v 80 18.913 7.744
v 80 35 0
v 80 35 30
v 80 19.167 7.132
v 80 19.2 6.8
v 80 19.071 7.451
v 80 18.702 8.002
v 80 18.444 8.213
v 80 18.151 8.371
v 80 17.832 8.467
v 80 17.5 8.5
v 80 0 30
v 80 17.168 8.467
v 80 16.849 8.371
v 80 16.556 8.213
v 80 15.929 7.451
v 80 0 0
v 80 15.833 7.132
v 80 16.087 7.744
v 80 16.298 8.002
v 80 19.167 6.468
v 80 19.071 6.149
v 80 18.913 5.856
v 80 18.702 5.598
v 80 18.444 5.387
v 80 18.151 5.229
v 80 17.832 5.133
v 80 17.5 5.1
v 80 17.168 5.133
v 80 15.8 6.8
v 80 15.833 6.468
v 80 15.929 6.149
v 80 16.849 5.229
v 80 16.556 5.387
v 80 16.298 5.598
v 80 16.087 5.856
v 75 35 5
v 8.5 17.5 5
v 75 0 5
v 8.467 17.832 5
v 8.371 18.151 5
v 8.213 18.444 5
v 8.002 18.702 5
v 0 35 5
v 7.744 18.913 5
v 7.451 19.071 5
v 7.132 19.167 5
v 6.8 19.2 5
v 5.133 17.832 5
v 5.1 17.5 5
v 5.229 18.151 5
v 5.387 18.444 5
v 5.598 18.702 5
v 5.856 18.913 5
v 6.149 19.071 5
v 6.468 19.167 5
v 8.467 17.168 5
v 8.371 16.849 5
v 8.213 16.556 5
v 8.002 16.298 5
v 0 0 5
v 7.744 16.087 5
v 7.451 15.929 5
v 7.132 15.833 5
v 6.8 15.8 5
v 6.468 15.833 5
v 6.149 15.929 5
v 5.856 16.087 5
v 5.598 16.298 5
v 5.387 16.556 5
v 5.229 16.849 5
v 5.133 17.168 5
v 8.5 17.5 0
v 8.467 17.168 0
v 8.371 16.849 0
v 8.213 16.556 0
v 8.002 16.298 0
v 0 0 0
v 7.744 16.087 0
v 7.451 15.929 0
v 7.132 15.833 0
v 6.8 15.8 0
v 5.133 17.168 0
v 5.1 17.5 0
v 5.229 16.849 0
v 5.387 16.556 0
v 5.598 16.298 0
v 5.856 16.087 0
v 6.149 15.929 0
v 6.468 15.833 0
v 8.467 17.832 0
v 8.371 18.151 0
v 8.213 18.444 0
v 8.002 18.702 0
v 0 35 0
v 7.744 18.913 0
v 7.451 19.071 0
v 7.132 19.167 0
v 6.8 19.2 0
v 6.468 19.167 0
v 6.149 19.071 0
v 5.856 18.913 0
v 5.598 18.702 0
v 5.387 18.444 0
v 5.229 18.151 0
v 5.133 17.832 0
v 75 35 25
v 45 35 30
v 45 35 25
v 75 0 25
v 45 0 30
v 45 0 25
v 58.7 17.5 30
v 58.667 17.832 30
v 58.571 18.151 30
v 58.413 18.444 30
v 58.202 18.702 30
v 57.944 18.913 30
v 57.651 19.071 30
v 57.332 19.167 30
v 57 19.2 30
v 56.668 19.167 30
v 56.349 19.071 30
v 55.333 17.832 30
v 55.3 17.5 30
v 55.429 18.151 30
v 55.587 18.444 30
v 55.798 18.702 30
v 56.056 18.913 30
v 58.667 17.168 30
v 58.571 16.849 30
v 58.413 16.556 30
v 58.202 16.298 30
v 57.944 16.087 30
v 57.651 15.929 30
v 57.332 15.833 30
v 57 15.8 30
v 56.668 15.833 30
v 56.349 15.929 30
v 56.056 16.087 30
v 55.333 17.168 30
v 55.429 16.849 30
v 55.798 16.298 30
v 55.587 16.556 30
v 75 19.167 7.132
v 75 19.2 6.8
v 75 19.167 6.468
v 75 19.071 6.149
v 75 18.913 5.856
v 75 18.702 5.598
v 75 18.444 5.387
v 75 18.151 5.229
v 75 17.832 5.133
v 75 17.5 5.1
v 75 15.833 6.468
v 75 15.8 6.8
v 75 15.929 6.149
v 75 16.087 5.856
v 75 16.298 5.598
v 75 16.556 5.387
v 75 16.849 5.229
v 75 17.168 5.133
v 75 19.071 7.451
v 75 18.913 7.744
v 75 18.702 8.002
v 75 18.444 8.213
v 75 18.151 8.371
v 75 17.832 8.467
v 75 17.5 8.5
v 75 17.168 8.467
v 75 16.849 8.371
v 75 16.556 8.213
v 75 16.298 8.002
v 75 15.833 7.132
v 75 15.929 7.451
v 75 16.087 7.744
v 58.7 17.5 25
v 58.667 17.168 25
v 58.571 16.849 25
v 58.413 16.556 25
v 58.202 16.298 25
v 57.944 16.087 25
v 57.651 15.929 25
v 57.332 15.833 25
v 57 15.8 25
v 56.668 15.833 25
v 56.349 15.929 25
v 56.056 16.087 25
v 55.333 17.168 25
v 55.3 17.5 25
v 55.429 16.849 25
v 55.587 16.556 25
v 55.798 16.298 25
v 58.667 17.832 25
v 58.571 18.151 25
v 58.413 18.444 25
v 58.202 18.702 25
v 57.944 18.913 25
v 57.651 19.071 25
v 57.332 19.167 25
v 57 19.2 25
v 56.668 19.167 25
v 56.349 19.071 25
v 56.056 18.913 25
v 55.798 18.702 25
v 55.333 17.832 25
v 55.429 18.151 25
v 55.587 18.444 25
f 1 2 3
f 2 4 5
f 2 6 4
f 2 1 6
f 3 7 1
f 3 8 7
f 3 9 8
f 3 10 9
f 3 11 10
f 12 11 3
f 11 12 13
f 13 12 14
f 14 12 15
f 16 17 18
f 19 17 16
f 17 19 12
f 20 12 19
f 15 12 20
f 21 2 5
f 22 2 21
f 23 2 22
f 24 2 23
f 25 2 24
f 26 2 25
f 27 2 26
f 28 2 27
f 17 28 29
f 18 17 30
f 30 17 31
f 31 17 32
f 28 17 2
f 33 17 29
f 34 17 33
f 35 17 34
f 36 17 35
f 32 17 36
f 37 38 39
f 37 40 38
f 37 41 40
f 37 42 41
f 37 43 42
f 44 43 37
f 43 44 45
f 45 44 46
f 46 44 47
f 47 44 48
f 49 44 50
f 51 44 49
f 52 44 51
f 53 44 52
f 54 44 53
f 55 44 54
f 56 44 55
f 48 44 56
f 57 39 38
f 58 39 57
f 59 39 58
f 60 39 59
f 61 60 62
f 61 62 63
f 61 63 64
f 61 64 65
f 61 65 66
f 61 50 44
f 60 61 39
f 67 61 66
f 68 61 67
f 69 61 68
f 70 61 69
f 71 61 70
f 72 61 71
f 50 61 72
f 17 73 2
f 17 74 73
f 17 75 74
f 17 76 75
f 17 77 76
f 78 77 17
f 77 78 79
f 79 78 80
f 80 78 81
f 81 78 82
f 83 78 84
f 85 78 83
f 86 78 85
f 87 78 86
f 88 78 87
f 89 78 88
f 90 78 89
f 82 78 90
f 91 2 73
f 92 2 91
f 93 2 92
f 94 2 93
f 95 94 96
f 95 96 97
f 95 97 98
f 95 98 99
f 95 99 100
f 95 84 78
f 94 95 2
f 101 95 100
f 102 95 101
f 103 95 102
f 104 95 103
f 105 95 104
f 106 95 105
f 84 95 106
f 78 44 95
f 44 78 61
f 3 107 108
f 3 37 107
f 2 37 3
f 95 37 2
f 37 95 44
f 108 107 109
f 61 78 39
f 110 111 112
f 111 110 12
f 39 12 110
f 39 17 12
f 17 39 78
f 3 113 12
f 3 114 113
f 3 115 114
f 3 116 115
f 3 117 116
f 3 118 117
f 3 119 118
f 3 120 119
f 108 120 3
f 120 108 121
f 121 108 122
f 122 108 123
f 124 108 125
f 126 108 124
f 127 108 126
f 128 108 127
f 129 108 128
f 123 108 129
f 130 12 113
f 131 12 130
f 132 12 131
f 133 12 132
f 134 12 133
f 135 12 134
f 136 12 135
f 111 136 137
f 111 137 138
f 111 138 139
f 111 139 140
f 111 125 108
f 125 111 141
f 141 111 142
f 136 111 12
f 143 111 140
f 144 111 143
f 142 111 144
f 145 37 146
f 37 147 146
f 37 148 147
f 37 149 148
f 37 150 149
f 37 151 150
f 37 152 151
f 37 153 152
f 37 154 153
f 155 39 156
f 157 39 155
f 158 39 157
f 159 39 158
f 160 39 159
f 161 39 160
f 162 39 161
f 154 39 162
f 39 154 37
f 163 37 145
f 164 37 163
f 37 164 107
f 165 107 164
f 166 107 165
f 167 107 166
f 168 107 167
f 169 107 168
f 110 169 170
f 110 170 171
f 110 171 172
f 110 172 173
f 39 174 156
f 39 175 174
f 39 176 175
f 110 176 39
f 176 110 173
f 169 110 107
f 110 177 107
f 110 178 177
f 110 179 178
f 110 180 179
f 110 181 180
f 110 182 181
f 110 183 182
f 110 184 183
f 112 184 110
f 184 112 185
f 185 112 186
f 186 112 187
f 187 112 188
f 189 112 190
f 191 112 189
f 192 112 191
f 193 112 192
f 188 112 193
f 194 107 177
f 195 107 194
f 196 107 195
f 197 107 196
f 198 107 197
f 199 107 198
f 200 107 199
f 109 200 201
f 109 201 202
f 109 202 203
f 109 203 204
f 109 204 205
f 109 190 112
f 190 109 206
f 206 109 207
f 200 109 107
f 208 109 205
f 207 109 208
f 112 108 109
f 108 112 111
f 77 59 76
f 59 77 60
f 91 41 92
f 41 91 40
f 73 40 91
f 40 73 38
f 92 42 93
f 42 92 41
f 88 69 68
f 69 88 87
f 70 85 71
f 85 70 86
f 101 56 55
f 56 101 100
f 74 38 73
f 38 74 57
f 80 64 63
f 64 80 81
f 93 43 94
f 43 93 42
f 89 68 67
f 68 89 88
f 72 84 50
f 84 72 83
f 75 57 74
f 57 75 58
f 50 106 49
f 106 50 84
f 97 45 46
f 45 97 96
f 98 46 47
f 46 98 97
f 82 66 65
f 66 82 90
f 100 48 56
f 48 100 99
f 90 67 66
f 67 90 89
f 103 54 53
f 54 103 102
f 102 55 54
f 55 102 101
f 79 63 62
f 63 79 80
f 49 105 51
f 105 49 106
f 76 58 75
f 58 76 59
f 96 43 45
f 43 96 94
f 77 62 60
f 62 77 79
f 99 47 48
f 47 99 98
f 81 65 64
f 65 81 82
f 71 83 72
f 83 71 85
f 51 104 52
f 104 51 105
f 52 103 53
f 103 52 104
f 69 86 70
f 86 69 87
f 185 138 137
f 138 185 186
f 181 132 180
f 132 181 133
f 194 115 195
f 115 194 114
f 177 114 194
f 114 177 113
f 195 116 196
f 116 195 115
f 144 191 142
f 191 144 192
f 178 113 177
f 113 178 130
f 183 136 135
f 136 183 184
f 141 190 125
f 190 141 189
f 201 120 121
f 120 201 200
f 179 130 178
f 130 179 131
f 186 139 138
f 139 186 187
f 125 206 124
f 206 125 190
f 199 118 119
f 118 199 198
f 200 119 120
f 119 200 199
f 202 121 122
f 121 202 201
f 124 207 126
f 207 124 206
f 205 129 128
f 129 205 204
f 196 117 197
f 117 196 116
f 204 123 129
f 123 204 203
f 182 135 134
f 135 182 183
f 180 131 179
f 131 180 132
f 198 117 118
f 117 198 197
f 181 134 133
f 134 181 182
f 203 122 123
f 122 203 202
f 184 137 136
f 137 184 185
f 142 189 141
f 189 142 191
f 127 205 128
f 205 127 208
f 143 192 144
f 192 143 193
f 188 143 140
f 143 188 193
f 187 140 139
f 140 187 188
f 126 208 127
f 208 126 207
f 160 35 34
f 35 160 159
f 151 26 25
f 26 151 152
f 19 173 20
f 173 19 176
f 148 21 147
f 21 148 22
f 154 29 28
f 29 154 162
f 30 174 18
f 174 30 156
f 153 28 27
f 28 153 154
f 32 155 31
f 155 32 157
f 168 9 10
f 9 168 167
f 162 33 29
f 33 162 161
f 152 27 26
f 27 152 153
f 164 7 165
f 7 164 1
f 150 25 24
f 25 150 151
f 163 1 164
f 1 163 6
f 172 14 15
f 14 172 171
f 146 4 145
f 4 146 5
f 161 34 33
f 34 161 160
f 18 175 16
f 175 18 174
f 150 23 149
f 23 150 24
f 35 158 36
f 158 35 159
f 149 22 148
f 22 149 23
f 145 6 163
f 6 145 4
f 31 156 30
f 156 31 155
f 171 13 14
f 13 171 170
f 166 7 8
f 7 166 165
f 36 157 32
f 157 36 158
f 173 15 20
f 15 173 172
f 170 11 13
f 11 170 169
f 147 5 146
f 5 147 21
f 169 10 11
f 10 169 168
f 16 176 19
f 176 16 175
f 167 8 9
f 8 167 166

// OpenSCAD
$fn = 32;

// ----------------------------------------------------------------------
// Z-bracket: 80 x 35 x 30 mm
// ----------------------------------------------------------------------

// --- parameters (mm) ---
foot_len = 80;            // lower foot length, X
top_len = 30;             // upper foot length, X
depth = 35;               // bracket width, Y
step_h = 30;              // overall rise, Z
plate_t = 5;              // plate thickness
hole_d = 3.4;             // clearance for M3

module hole_z(px, py, z0) {
  translate([px, py, z0 - 0.5]) cylinder(h = plate_t + 1, d = hole_d);
}
module hole_x(py, pz) {
  translate([-0.5, py, pz]) rotate([0, 90, 0]) cylinder(h = plate_t + 1, d = hole_d);
}

difference() {
  union() {
    cube([foot_len, depth, plate_t]);
    /* web, overlapping the lower foot */
    translate([foot_len - plate_t, 0, 0]) cube([plate_t, depth, step_h]);
    /* upper foot, sunk into the web */
    translate([foot_len - plate_t - top_len, 0, step_h - plate_t]) cube([top_len + plate_t, depth, plate_t]);
  }
  hole_z(6.8, 17.5, 0);
  translate([foot_len - plate_t - 18, 0, 0]) hole_z(0, 17.5, step_h - plate_t);
  translate([foot_len - plate_t, 0, 0]) hole_x(17.5, 6.8);
}
